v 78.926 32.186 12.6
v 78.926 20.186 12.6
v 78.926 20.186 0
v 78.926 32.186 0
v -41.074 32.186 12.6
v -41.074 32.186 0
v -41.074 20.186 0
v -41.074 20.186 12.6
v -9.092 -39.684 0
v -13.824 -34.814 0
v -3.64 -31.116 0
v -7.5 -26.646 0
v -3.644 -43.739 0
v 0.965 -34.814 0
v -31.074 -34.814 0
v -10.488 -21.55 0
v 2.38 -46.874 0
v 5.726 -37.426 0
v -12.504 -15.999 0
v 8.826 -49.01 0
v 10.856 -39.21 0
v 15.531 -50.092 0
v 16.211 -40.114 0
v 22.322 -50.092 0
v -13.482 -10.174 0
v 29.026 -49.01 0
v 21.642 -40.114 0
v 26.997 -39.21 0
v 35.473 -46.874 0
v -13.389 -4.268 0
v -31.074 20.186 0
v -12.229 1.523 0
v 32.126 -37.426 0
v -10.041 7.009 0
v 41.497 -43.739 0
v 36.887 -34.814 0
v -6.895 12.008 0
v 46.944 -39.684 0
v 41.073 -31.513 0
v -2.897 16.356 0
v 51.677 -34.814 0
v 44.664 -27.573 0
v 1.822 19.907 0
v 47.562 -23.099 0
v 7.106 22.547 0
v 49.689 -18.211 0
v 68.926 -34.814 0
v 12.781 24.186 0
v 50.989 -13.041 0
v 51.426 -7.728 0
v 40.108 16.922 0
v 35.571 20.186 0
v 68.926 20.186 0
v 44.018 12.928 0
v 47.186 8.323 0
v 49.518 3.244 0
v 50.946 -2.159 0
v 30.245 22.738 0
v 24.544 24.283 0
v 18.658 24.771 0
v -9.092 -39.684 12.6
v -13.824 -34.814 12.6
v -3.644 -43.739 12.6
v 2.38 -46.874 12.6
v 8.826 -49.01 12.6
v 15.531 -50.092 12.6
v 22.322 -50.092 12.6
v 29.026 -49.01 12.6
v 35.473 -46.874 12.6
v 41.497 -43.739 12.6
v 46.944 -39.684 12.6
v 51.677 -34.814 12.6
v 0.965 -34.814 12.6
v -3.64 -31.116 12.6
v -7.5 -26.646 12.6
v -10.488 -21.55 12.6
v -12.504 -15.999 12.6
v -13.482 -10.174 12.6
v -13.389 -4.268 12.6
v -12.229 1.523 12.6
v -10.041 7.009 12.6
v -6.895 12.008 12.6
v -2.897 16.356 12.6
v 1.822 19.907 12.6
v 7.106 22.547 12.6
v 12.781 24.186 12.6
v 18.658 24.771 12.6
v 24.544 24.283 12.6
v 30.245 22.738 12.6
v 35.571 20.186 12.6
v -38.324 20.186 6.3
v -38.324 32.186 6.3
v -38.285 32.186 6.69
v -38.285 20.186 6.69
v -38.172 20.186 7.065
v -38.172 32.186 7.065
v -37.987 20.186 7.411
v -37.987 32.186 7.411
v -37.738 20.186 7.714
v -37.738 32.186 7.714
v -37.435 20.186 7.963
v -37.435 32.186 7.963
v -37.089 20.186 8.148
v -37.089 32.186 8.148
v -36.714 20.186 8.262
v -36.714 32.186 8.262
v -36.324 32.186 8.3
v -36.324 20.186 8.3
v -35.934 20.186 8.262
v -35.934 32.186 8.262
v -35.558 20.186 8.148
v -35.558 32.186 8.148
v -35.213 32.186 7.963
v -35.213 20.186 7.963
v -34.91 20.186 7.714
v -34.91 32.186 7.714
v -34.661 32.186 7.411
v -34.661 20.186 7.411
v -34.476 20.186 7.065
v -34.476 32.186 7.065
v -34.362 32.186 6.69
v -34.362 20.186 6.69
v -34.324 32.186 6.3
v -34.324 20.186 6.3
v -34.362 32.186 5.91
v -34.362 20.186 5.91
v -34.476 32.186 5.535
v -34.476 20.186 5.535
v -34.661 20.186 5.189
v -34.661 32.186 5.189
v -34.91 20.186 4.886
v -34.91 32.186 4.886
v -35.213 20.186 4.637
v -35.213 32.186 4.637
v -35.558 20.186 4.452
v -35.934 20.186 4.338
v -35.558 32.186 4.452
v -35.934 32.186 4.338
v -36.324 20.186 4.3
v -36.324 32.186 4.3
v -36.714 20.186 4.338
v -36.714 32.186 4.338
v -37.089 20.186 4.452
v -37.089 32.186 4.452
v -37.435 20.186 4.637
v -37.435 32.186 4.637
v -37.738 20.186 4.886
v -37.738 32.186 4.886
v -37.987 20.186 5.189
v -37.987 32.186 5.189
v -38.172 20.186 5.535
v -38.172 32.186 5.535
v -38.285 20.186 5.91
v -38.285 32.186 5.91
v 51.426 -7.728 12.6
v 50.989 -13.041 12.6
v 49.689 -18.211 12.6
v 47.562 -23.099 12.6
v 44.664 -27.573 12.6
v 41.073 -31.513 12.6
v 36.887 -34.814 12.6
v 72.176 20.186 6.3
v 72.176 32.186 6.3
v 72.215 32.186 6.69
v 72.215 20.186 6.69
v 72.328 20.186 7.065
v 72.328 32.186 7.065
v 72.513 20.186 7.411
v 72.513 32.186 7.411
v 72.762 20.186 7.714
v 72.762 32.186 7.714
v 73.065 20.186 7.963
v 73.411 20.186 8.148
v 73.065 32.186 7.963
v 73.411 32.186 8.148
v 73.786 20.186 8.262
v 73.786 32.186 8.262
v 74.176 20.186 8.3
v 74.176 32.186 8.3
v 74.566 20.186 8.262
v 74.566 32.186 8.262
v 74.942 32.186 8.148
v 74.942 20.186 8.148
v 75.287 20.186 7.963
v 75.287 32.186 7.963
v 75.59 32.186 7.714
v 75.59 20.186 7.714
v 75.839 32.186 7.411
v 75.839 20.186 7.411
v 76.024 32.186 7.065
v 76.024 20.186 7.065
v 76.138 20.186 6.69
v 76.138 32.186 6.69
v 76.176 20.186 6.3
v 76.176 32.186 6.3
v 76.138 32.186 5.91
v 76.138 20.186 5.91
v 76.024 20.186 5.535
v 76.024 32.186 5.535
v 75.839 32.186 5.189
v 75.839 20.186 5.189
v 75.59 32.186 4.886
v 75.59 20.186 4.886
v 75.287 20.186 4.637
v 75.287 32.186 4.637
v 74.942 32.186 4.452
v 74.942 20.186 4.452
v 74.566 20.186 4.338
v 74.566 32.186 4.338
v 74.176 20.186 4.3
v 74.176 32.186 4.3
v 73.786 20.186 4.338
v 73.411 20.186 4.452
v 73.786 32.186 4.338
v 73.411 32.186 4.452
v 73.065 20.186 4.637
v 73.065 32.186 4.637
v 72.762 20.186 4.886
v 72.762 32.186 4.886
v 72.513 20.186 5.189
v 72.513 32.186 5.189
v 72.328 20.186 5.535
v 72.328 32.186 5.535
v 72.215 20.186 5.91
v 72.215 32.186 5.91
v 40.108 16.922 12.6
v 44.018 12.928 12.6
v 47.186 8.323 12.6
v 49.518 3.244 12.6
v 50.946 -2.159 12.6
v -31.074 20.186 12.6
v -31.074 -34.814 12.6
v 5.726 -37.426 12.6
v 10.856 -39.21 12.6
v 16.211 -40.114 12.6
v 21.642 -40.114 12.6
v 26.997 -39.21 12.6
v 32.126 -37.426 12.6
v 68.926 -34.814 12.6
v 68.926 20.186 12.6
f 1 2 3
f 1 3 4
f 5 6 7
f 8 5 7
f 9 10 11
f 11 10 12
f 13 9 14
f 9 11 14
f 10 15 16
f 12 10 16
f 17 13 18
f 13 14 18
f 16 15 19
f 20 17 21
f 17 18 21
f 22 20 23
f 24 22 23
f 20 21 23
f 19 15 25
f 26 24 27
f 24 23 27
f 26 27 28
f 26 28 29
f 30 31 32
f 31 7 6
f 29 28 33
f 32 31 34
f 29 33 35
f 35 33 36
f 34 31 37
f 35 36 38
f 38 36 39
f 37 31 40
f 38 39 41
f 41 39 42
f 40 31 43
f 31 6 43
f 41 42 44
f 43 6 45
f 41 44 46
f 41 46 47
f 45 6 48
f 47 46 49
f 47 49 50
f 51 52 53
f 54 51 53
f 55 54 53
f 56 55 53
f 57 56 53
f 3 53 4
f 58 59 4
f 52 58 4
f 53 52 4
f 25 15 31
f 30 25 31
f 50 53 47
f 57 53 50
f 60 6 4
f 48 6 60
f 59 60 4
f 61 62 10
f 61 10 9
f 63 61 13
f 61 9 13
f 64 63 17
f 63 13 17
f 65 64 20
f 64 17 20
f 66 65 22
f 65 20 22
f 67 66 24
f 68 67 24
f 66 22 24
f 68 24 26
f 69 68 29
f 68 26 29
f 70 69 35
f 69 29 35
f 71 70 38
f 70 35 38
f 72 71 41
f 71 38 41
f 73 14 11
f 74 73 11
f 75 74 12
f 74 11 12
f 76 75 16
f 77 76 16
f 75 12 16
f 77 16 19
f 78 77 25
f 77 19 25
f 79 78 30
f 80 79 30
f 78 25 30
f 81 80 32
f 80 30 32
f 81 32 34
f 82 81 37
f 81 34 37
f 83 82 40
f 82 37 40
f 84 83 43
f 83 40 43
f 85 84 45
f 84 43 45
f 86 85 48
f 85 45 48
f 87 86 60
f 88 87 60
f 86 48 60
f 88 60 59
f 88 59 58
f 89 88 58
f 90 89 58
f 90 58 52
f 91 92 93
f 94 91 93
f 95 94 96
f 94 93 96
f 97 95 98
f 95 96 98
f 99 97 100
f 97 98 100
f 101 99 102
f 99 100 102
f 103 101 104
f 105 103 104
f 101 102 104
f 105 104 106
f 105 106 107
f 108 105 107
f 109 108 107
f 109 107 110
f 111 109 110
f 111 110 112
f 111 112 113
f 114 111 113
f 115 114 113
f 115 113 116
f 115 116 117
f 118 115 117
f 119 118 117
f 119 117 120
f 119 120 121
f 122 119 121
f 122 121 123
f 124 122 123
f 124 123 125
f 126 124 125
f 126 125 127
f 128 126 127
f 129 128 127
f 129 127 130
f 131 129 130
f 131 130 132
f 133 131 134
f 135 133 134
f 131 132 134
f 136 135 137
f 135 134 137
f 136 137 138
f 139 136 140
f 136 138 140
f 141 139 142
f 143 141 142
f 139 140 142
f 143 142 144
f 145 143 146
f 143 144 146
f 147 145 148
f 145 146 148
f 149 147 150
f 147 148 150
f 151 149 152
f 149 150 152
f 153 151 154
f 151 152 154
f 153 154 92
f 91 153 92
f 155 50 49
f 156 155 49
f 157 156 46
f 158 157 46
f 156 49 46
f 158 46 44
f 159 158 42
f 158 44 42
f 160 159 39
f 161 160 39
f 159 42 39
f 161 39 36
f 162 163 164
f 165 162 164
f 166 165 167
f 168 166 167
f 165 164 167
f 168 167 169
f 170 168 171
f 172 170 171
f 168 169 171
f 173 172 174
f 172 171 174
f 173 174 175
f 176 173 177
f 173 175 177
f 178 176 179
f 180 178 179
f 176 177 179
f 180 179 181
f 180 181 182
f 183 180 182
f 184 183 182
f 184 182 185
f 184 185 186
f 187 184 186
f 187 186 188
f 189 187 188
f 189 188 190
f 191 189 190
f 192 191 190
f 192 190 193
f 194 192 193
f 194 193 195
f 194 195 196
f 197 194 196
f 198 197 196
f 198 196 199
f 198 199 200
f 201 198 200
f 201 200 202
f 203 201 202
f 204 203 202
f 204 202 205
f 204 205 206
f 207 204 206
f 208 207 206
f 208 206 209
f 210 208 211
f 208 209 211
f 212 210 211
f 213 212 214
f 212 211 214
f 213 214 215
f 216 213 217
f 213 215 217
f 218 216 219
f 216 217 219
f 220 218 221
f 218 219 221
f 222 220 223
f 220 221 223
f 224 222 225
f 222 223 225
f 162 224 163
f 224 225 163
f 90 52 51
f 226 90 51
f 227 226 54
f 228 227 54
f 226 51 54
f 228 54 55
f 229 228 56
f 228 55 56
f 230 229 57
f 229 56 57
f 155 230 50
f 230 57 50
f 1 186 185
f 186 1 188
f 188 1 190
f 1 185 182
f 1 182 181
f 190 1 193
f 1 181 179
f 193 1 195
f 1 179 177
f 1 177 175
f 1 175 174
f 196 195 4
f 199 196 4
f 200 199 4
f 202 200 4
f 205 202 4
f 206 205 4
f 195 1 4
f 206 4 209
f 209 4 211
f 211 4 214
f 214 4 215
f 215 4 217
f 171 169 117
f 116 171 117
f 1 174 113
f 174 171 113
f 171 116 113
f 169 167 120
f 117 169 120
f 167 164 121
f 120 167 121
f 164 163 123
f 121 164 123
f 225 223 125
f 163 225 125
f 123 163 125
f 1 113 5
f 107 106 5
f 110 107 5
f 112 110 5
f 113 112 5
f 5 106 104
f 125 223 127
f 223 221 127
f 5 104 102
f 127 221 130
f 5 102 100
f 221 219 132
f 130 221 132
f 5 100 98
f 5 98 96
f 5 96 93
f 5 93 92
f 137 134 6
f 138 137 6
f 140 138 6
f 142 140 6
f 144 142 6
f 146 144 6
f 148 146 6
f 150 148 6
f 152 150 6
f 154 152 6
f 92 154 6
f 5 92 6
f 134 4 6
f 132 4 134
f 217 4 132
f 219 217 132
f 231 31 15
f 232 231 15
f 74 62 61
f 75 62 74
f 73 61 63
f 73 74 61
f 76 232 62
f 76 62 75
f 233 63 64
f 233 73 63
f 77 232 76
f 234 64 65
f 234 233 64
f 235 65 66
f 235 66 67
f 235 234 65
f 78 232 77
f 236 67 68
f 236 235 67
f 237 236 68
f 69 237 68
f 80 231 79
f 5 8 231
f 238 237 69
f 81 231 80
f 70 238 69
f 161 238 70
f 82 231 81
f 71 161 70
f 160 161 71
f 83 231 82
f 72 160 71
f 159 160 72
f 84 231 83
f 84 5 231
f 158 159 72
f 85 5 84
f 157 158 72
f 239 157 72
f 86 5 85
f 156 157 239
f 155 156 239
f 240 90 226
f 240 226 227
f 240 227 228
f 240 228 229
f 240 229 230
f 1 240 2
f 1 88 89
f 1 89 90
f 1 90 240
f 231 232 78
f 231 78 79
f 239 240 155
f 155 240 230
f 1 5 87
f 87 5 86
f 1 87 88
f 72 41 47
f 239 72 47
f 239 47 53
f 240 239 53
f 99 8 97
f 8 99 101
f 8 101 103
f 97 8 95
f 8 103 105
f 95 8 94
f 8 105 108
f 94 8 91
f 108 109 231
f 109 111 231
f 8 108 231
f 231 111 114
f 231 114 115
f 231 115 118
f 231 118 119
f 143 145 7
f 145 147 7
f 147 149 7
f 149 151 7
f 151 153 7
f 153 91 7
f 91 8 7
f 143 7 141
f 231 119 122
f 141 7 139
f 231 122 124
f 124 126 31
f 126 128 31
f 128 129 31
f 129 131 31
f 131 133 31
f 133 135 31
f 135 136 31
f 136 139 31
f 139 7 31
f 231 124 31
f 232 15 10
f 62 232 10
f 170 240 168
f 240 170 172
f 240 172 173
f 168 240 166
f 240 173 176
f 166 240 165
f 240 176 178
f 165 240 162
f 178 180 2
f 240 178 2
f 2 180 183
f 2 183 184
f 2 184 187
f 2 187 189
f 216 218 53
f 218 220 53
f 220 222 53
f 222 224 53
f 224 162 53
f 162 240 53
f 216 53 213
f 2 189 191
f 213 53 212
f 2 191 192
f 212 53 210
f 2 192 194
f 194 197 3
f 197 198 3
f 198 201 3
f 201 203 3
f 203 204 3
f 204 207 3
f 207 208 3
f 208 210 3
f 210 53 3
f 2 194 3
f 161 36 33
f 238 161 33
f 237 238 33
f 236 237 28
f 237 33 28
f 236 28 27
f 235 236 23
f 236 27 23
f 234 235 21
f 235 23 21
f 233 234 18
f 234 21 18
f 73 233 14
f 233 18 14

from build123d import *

# Parameters (mm, degrees)
F1_DEPTH = 12.6
F2_R     = 2
F3_DEPTH = 82.4149229208


# Not quite as in the source:
# - a feature names something its author has since deleted; it is built from what else it names


with BuildPart() as f1:
    # F0 (on Top) → F1 (new body)
    with BuildSketch(Plane.XY):
        with BuildLine():
            Line((4.3273164821, 32.1861776987), (-41.0737535205, 32.1861776987))
            Line((-41.0737535205, 32.1861776987), (-41.0737535205, 20.1861776987))
            Line((-41.0737535205, 20.1861776987), (-31.0737535205, 20.1861776987))
            Line((-31.0737535205, 20.1861776987), (-13.1215757112, 20.1861776987))
            ThreePointArc((-13.1215757112, 20.1861776987), (-5.1565247985, 27.2903947567), (4.3273164821, 32.1861776987))
        make_face()
        with BuildLine():
            Line((33.525176477, 32.1861776987), (4.3273164821, 32.1861776987))
            ThreePointArc((4.3273164821, 32.1861776987), (-5.1565247985, 27.2903947567), (-13.1215757112, 20.1861776987))
            Line((-13.1215757112, 20.1861776987), (2.2810397469, 20.1861776987))
            ThreePointArc((2.2810397469, 20.1861776987), (18.9262464795, 24.7722547779), (35.5714532121, 20.1861776987))
            Line((35.5714532121, 20.1861776987), (50.9740686703, 20.1861776987))
            ThreePointArc((50.9740686703, 20.1861776987), (43.0090177575, 27.2903947567), (33.525176477, 32.1861776987))
        make_face()
        with BuildLine():
            Line((78.9262464795, 32.1861776987), (33.525176477, 32.1861776987))
            ThreePointArc((33.525176477, 32.1861776987), (43.0090177575, 27.2903947567), (50.9740686703, 20.1861776987))
            Line((50.9740686703, 20.1861776987), (68.9262464795, 20.1861776987))
            Line((68.9262464795, 20.1861776987), (78.9262464795, 20.1861776987))
            Line((78.9262464795, 20.1861776987), (78.9262464795, 32.1861776987))
        make_face()
        with BuildLine():
            Line((68.9262464795, 20.1861776987), (50.9740686703, 20.1861776987))
            ThreePointArc((50.9740686703, 20.1861776987), (58.7275180868, 7.1755691223), (61.4262464795, -7.7277452221))
            ThreePointArc((61.4262464795, -7.7277452221), (58.9146555301, -22.121394572), (51.6767339333, -34.8138223013))
            Line((51.6767339333, -34.8138223013), (68.9262464795, -34.8138223013))
            Line((68.9262464795, -34.8138223013), (68.9262464795, 20.1861776987))
        make_face()
        with BuildLine():
            ThreePointArc((-13.8242409743, -34.8138223013), (-23.5702855343, -7.1848209158), (-13.1215757112, 20.1861776987))
            Line((-13.1215757112, 20.1861776987), (-31.0737535205, 20.1861776987))
            Line((-31.0737535205, 20.1861776987), (-31.0737535205, -34.8138223013))
            Line((-31.0737535205, -34.8138223013), (-19.9806198337, -34.8138223013))
            Line((-19.9806198337, -34.8138223013), (-13.8242409743, -34.8138223013))
        make_face()
        with BuildLine():
            Line((2.2810397469, 20.1861776987), (-13.1215757112, 20.1861776987))
            ThreePointArc((-13.1215757112, 20.1861776987), (-23.5702855343, -7.1848209158), (-13.8242409743, -34.8138223013))
            Line((-13.8242409743, -34.8138223013), (0.9653325701, -34.8138223013))
            ThreePointArc((0.9653325701, -34.8138223013), (-13.5644582908, -6.9505042503), (2.2810397469, 20.1861776987))
        make_face()
        with BuildLine():
            ThreePointArc((61.4262464795, -7.7277452221), (58.7275180868, 7.1755691223), (50.9740686703, 20.1861776987))
            Line((50.9740686703, 20.1861776987), (35.5714532121, 20.1861776987))
            ThreePointArc((35.5714532121, 20.1861776987), (47.1859281728, 8.3234351269), (51.4262464795, -7.7277452221))
            ThreePointArc((51.4262464795, -7.7277452221), (47.5617113968, -23.0985015136), (36.8871603889, -34.8138223013))
            Line((36.8871603889, -34.8138223013), (51.6767339333, -34.8138223013))
            ThreePointArc((51.6767339333, -34.8138223013), (58.9146555301, -22.121394572), (61.4262464795, -7.7277452221))
        make_face()
        with BuildLine():
            Line((0.9653325701, -34.8138223013), (-13.8242409743, -34.8138223013))
            ThreePointArc((-13.8242409743, -34.8138223013), (18.9262464795, -50.2277452221), (51.6767339333, -34.8138223013))
            Line((51.6767339333, -34.8138223013), (36.8871603889, -34.8138223013))
            ThreePointArc((36.8871603889, -34.8138223013), (18.9262464795, -40.2277452221), (0.9653325701, -34.8138223013))
        make_face()
    extrude(amount=F1_DEPTH)

    # F2 (on face) → F3 (cut, through all)
    with BuildSketch(Plane(origin=(0, 32.1861776987, 0), x_dir=(-1, 0, 0), z_dir=(0, 1, 0))):
        with Locations((-74.1762464795, 6.3)):
            Circle(F2_R)
        with Locations((36.3237535205, 6.3)):
            Circle(F2_R)
    extrude(amount=-F3_DEPTH, mode=Mode.SUBTRACT)


solid = f1.part
